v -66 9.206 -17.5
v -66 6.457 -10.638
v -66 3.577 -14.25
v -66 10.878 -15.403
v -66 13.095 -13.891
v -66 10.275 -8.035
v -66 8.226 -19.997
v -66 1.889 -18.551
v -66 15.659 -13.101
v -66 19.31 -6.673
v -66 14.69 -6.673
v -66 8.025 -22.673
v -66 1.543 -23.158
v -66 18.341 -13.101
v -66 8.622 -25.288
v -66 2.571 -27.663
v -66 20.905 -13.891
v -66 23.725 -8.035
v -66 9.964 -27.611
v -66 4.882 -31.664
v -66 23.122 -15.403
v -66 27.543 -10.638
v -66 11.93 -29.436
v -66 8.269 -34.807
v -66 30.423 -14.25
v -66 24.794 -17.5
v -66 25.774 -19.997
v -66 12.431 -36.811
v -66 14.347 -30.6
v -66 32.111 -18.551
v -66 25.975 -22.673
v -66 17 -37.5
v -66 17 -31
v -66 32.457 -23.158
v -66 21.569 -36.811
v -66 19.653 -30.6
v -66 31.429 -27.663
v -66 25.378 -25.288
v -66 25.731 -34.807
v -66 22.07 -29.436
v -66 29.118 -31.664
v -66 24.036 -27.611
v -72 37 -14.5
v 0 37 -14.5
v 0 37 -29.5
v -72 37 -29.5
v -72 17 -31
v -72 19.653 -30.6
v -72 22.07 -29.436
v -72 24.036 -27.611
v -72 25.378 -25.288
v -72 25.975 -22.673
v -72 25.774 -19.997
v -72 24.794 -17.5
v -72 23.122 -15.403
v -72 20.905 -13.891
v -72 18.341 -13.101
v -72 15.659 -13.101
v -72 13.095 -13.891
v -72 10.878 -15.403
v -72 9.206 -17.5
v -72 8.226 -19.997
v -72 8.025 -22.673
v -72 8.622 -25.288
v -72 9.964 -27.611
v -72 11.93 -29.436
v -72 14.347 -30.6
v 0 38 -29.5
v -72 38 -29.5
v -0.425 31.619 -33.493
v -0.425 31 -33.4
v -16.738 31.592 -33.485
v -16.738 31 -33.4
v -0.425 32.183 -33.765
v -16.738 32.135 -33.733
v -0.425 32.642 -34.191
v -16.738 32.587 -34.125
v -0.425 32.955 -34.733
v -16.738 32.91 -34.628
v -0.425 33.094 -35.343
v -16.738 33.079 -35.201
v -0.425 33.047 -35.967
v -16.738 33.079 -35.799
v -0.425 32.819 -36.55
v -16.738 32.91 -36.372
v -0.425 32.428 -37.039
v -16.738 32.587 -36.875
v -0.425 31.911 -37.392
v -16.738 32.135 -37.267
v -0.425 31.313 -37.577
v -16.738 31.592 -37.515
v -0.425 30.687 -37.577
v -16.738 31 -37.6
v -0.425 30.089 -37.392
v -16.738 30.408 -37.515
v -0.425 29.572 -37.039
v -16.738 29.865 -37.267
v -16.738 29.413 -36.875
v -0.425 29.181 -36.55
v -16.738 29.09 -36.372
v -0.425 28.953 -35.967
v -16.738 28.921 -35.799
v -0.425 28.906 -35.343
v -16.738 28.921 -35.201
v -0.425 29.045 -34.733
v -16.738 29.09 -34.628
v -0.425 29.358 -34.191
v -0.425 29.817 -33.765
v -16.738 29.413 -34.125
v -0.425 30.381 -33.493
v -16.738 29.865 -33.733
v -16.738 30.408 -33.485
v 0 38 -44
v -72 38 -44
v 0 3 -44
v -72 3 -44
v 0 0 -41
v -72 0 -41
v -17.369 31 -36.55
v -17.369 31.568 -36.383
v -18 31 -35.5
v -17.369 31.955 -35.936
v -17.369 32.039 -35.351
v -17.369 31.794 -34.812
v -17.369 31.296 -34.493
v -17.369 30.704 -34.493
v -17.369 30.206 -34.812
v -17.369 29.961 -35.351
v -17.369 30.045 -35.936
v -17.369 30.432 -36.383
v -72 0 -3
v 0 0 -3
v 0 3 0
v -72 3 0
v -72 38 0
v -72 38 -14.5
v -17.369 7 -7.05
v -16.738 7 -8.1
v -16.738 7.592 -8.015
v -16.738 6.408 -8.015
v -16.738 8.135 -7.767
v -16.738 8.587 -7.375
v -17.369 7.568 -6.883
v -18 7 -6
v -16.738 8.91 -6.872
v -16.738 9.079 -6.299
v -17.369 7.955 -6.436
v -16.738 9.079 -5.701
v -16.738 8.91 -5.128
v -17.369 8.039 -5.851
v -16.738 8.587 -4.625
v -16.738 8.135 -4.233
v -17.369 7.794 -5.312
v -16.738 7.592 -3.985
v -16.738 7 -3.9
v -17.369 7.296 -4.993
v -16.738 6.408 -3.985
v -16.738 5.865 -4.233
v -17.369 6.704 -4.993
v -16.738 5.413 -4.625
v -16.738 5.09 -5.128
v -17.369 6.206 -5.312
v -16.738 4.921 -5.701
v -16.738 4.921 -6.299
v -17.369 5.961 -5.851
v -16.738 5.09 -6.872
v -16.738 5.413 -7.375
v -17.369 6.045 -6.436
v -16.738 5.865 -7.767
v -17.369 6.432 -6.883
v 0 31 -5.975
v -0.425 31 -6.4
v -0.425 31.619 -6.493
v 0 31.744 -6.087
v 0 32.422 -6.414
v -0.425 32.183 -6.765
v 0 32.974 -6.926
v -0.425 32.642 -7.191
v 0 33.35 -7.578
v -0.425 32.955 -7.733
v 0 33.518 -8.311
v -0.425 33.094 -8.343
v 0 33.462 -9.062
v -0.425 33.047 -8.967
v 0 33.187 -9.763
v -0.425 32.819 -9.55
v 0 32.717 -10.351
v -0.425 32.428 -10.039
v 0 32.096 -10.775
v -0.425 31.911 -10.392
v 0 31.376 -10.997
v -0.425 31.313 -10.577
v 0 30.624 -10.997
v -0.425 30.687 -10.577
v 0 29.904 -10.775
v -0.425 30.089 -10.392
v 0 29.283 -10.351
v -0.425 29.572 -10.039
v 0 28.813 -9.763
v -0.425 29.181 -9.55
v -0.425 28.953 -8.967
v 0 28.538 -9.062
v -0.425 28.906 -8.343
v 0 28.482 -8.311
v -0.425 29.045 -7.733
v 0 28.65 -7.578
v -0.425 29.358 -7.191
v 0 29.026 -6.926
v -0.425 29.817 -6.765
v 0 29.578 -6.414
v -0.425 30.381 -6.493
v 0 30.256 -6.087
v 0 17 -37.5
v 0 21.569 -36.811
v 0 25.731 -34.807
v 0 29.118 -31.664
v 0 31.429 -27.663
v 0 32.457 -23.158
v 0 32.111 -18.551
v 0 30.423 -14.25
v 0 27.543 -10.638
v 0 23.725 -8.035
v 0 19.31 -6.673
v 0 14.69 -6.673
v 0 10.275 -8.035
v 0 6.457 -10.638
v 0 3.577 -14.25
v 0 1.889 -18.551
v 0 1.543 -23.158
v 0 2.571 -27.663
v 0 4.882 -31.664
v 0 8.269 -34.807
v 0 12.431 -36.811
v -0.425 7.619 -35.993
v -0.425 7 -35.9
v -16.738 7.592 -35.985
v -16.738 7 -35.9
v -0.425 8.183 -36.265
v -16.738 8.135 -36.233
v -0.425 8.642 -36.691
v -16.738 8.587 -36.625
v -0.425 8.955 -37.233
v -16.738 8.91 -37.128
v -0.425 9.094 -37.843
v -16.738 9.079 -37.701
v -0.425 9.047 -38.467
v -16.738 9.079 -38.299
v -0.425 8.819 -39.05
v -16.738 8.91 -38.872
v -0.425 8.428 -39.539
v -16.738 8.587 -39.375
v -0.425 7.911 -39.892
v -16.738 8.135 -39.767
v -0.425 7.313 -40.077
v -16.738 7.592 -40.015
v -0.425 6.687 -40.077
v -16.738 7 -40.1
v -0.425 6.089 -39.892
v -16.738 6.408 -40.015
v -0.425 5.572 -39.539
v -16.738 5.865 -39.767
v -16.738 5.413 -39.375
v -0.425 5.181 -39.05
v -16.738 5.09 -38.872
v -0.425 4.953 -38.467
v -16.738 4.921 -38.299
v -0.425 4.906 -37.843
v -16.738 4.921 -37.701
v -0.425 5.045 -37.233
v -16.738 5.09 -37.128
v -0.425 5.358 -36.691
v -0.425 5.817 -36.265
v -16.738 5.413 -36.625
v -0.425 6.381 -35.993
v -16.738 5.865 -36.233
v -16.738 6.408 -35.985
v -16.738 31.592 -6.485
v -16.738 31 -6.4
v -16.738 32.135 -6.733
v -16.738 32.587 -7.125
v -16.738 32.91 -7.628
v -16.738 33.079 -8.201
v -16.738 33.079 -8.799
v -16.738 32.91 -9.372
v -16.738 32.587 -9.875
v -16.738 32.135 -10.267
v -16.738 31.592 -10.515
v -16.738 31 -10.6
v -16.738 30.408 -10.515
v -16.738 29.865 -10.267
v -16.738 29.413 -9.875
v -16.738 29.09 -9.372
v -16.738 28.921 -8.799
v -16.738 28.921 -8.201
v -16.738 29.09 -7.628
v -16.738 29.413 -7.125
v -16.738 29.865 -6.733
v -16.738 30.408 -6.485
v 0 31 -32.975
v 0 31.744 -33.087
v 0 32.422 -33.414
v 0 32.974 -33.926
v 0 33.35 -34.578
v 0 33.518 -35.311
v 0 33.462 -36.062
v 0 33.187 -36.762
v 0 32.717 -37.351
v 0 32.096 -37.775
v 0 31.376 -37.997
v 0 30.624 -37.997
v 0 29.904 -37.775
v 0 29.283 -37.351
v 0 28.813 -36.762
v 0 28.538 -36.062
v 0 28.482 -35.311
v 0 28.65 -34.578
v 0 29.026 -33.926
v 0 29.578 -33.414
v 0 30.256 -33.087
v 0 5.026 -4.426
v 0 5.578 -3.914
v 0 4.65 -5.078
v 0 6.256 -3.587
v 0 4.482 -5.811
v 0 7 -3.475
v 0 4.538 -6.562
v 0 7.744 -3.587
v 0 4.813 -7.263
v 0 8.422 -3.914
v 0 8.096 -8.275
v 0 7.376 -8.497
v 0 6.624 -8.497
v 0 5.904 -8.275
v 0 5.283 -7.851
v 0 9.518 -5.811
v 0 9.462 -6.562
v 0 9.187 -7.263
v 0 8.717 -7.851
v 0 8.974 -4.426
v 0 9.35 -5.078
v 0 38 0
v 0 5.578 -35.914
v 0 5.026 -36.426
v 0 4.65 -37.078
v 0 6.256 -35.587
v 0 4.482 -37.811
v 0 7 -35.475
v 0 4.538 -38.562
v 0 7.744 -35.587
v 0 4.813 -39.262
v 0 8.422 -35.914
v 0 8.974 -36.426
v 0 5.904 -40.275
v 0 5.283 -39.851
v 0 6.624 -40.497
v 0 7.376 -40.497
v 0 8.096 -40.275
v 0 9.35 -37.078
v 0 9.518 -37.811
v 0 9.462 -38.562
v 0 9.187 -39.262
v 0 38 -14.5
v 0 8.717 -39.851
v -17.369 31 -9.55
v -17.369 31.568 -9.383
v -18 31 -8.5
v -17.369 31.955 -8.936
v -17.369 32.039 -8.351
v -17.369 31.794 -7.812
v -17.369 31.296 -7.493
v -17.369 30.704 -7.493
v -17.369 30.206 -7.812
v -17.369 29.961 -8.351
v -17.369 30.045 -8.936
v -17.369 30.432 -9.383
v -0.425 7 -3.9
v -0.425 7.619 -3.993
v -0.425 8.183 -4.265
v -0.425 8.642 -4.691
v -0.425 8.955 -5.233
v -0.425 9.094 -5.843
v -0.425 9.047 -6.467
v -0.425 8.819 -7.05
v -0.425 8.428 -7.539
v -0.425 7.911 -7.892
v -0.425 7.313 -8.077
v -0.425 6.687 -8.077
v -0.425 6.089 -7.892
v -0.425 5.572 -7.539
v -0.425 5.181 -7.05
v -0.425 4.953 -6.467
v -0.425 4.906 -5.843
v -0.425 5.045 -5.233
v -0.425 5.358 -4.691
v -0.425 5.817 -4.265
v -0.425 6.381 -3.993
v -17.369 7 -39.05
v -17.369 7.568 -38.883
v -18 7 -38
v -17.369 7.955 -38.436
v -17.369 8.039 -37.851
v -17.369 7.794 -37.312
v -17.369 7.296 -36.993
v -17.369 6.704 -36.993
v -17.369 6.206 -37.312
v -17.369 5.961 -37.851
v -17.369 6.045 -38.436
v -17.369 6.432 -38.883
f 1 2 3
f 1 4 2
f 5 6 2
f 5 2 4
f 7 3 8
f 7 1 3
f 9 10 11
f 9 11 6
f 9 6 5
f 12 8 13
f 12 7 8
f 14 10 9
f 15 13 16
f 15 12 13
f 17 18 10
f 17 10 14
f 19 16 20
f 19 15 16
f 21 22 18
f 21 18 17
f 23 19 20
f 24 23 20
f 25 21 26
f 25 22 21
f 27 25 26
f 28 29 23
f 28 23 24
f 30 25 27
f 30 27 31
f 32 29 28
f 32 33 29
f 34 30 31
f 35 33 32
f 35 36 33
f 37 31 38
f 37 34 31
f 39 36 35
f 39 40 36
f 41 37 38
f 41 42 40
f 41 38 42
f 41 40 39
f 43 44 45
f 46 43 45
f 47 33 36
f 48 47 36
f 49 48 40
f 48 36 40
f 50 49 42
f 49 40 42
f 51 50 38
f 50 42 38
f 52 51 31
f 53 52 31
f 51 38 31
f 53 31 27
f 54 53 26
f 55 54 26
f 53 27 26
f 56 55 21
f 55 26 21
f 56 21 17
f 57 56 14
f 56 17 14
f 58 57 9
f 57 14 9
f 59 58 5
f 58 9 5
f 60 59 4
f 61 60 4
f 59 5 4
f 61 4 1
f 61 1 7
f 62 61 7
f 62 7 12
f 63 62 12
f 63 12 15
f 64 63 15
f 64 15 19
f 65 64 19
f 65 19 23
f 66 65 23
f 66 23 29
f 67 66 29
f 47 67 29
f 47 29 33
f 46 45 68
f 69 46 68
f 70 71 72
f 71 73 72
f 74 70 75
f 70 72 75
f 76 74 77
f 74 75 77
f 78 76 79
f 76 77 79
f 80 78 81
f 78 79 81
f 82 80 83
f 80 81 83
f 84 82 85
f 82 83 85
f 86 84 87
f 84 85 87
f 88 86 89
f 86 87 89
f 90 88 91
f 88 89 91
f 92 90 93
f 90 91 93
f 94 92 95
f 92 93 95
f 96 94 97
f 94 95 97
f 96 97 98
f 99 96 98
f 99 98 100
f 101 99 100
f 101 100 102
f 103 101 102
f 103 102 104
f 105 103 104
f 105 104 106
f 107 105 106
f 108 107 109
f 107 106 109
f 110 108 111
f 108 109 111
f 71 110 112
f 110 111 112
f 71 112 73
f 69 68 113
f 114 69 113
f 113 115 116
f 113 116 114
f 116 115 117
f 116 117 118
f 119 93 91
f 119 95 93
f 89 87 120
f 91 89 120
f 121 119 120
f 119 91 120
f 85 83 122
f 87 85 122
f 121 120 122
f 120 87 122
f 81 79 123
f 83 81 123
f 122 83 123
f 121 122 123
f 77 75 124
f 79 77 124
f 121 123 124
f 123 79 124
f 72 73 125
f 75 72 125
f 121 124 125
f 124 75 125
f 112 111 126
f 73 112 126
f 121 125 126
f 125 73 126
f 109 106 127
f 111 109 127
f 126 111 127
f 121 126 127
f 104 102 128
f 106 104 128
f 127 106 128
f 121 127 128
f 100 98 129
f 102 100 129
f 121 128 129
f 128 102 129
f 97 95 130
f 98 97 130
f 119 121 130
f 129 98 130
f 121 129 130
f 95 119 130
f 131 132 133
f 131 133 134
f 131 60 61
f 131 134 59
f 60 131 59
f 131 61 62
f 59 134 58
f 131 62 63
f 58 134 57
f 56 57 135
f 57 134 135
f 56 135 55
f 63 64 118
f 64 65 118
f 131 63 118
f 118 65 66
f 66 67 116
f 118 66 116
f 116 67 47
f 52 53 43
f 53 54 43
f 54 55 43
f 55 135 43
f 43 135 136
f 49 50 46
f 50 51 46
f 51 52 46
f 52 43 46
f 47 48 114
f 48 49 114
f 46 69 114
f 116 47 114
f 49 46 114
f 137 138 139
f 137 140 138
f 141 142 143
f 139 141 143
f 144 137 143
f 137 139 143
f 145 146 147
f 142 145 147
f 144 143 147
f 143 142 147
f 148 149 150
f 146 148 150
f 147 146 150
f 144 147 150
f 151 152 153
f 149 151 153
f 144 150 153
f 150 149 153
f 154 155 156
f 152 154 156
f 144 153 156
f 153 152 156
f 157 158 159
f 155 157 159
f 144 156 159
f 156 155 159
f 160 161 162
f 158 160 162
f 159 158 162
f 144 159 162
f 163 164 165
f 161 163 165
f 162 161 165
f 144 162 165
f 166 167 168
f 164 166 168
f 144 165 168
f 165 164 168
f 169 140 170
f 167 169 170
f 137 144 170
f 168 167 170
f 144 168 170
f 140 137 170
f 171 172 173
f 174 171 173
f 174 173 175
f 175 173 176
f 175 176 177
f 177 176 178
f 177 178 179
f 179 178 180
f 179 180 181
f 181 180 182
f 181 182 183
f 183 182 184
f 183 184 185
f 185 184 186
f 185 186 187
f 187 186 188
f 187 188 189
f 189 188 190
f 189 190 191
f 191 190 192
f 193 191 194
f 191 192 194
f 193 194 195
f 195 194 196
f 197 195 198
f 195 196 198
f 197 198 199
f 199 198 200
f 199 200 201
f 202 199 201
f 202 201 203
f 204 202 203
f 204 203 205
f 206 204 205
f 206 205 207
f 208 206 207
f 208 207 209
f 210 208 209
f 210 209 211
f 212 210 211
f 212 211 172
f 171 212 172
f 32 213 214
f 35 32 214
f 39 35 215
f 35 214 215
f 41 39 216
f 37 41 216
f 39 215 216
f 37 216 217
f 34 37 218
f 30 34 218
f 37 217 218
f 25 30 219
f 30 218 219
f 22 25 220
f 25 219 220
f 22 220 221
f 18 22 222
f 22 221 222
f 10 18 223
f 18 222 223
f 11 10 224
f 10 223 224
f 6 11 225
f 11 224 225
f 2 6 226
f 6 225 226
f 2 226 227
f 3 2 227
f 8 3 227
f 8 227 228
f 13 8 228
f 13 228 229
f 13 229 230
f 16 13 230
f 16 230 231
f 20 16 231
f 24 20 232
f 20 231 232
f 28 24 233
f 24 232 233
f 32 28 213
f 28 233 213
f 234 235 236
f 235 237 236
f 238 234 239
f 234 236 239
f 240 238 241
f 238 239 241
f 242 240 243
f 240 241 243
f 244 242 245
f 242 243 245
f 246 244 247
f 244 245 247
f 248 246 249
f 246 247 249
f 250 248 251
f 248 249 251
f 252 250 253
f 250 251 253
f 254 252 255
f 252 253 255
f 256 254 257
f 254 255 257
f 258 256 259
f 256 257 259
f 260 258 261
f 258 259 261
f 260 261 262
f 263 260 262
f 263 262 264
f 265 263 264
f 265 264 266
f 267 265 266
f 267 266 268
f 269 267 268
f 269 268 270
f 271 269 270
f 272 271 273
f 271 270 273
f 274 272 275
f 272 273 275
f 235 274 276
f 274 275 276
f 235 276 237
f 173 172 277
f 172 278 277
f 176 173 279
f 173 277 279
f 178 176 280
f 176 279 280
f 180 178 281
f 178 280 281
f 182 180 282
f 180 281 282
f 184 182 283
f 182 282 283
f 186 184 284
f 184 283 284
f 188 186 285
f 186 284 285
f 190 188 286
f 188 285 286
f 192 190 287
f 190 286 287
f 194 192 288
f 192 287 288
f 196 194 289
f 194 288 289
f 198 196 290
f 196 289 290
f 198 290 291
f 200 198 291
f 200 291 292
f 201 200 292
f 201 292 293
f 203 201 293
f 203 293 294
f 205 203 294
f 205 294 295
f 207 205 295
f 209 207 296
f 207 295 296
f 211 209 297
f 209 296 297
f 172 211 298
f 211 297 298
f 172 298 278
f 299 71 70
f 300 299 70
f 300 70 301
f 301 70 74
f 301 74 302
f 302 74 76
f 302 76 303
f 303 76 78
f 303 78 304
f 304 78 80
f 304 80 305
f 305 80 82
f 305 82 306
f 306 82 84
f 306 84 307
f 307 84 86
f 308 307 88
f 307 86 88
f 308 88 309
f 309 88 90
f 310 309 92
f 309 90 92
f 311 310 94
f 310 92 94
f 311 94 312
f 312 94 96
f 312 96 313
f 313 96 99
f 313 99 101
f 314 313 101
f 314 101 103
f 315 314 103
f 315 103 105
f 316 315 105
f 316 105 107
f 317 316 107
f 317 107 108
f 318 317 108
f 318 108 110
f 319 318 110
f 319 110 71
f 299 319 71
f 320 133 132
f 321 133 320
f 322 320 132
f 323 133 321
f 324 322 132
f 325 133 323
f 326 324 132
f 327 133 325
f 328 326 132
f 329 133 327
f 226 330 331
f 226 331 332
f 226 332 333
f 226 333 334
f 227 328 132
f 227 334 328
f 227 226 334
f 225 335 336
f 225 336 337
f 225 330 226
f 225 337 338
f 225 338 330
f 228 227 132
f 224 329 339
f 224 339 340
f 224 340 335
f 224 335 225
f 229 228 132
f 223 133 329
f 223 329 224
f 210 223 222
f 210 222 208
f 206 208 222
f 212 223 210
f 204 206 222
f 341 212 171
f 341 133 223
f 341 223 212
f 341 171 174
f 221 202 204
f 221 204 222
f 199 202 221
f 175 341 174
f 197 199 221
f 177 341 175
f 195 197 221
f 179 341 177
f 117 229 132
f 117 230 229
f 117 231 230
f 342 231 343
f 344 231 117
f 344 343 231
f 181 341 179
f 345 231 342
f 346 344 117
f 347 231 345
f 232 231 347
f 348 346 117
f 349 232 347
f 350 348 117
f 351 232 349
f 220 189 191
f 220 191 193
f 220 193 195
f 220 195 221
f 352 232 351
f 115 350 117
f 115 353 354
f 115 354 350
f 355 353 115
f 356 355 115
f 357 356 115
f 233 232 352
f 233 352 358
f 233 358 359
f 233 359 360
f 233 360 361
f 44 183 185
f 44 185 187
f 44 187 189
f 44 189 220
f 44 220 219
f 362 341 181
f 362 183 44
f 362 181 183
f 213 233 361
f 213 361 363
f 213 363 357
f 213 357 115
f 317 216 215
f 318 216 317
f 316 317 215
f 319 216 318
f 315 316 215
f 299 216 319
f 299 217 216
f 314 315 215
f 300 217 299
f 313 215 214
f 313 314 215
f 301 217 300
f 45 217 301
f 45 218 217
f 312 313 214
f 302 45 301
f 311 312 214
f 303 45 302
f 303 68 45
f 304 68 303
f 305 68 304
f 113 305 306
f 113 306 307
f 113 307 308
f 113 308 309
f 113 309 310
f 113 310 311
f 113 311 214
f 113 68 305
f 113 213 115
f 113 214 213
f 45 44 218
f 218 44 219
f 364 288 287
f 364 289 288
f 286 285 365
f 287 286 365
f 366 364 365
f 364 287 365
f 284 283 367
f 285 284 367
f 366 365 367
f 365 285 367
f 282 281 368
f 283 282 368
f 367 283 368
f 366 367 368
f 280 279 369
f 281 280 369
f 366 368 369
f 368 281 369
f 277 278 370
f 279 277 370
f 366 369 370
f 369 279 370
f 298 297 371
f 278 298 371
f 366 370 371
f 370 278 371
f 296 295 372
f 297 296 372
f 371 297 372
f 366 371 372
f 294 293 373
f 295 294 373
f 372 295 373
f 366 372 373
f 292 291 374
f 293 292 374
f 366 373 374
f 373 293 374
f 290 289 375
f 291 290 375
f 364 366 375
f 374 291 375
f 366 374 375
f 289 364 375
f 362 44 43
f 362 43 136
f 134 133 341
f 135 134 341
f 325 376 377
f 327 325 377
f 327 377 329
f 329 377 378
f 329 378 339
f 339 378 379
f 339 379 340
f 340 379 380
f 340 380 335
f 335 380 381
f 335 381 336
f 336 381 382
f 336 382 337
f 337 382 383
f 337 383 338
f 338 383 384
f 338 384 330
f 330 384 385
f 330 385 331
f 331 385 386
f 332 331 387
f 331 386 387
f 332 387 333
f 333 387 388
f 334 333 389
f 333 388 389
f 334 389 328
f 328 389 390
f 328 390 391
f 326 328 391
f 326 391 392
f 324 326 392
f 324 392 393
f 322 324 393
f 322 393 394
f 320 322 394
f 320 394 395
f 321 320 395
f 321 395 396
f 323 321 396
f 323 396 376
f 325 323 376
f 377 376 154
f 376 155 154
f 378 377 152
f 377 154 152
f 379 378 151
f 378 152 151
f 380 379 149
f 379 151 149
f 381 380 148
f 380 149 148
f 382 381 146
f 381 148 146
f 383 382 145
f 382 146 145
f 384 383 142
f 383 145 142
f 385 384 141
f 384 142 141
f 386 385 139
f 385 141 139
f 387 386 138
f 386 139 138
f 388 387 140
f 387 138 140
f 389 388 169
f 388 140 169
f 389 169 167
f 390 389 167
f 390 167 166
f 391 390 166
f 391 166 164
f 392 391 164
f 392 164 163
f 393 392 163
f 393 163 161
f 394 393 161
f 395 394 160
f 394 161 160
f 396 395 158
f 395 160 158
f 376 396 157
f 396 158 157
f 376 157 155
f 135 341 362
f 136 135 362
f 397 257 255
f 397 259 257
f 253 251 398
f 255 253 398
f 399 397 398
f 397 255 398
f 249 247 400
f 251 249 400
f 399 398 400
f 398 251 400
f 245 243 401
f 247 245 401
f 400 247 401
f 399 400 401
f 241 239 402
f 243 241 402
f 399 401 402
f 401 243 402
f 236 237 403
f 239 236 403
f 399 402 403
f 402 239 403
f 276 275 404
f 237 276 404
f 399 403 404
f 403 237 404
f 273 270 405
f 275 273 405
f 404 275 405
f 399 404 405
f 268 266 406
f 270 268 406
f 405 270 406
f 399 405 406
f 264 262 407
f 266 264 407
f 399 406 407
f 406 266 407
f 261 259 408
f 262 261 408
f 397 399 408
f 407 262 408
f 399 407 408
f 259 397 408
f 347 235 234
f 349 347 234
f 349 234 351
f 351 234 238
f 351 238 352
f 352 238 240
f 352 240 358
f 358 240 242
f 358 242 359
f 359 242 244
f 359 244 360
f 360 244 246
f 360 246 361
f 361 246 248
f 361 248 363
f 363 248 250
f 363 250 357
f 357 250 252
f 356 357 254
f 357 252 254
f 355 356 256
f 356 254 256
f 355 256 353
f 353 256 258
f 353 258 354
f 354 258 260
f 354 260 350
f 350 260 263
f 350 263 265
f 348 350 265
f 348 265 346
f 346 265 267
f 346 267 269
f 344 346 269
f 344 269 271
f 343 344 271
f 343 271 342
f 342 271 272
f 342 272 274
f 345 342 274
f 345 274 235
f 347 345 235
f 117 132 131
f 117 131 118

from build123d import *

# Parameters (mm, degrees)
ESBO_O1_W                       = 44
ESBO_O1_H                       = 38
RESSALTO_EXTRUS_O1_DEPTH        = 72
ESBO_O2_R                       = 15.5
CORTE_EXTRUS_O1_DEPTH           = 66
ESBO_O4_R                       = 9
CORTE_EXTRUS_O2_DEPTH           = 88.954533709
FURO_ROSCADO_DE_M51_D           = 4.2
FURO_ROSCADO_DE_M51_DEPTH       = 16.7381927
FURO_ROSCADO_DE_M51_CSINK_D     = 5.05
FURO_ROSCADO_DE_M51_CSINK_ANGLE = 90
FURO_ROSCADO_DE_M51_TIP         = 1.2618073
CHANFRO1_SIZE                   = 3
ESBO_O7_W                       = 15
ESBO_O7_H                       = 1
CORTE_EXTRUS_O3_DEPTH           = 93.54188241


with BuildPart() as part:
    # Esboço1 → Ressalto-extrusão1 (new body)
    with BuildSketch(Plane(origin=(0, 0, 0), x_dir=(0, 0, -1), z_dir=(1, 0, 0))):
        with Locations((22, 19)):
            Rectangle(ESBO_O1_W, ESBO_O1_H)
    extrude(amount=-RESSALTO_EXTRUS_O1_DEPTH)

    # Esboço2 → Corte-extrusão1 (cut)
    with BuildSketch(Plane(origin=(0, 0, 0), x_dir=(0, 0, -1), z_dir=(1, 0, 0))):
        with Locations((22, 17)):
            Circle(ESBO_O2_R)
    extrude(amount=-CORTE_EXTRUS_O1_DEPTH, mode=Mode.SUBTRACT)

    # Esboço4 → Corte-extrusão2 (cut, through all)
    with BuildSketch(Plane(origin=(-66, 0, 0), x_dir=(0, 0, -1), z_dir=(1, 0, 0))):
        with Locations((22, 17)):
            Circle(ESBO_O4_R)
    extrude(amount=-CORTE_EXTRUS_O2_DEPTH, mode=Mode.SUBTRACT)

    # Furo roscado de M51
    with Locations(Plane(origin=(0, 0, 0), x_dir=(0, 0, -1), z_dir=(1, 0, 0))):
        with Locations((8.5, 31), (35.5, 31), (38, 7), (6, 7)):
            CounterSinkHole(FURO_ROSCADO_DE_M51_D / 2, FURO_ROSCADO_DE_M51_CSINK_D / 2, depth=FURO_ROSCADO_DE_M51_DEPTH, counter_sink_angle=FURO_ROSCADO_DE_M51_CSINK_ANGLE)
            with Locations((0, 0, -(FURO_ROSCADO_DE_M51_DEPTH + FURO_ROSCADO_DE_M51_TIP / 2))):  # 118° drill point
                Cone(0, FURO_ROSCADO_DE_M51_D / 2, FURO_ROSCADO_DE_M51_TIP, mode=Mode.SUBTRACT)

    # Chanfro1
    chanfro1_edges = [part.edges().sort_by_distance(p)[0] for p in [
        (-36, 0, -44),
        (-36, 0, 0),
    ]]
    chamfer(chanfro1_edges, length=CHANFRO1_SIZE)

    # Esboço7 → Corte-extrusão3 (cut, through all)
    with BuildSketch(Plane(origin=(0, 0, 0), x_dir=(0, 0, -1), z_dir=(1, 0, 0))):
        with Locations((22, 37.5)):
            Rectangle(ESBO_O7_W, ESBO_O7_H)
    extrude(amount=-CORTE_EXTRUS_O3_DEPTH, mode=Mode.SUBTRACT)


solid = part.part
